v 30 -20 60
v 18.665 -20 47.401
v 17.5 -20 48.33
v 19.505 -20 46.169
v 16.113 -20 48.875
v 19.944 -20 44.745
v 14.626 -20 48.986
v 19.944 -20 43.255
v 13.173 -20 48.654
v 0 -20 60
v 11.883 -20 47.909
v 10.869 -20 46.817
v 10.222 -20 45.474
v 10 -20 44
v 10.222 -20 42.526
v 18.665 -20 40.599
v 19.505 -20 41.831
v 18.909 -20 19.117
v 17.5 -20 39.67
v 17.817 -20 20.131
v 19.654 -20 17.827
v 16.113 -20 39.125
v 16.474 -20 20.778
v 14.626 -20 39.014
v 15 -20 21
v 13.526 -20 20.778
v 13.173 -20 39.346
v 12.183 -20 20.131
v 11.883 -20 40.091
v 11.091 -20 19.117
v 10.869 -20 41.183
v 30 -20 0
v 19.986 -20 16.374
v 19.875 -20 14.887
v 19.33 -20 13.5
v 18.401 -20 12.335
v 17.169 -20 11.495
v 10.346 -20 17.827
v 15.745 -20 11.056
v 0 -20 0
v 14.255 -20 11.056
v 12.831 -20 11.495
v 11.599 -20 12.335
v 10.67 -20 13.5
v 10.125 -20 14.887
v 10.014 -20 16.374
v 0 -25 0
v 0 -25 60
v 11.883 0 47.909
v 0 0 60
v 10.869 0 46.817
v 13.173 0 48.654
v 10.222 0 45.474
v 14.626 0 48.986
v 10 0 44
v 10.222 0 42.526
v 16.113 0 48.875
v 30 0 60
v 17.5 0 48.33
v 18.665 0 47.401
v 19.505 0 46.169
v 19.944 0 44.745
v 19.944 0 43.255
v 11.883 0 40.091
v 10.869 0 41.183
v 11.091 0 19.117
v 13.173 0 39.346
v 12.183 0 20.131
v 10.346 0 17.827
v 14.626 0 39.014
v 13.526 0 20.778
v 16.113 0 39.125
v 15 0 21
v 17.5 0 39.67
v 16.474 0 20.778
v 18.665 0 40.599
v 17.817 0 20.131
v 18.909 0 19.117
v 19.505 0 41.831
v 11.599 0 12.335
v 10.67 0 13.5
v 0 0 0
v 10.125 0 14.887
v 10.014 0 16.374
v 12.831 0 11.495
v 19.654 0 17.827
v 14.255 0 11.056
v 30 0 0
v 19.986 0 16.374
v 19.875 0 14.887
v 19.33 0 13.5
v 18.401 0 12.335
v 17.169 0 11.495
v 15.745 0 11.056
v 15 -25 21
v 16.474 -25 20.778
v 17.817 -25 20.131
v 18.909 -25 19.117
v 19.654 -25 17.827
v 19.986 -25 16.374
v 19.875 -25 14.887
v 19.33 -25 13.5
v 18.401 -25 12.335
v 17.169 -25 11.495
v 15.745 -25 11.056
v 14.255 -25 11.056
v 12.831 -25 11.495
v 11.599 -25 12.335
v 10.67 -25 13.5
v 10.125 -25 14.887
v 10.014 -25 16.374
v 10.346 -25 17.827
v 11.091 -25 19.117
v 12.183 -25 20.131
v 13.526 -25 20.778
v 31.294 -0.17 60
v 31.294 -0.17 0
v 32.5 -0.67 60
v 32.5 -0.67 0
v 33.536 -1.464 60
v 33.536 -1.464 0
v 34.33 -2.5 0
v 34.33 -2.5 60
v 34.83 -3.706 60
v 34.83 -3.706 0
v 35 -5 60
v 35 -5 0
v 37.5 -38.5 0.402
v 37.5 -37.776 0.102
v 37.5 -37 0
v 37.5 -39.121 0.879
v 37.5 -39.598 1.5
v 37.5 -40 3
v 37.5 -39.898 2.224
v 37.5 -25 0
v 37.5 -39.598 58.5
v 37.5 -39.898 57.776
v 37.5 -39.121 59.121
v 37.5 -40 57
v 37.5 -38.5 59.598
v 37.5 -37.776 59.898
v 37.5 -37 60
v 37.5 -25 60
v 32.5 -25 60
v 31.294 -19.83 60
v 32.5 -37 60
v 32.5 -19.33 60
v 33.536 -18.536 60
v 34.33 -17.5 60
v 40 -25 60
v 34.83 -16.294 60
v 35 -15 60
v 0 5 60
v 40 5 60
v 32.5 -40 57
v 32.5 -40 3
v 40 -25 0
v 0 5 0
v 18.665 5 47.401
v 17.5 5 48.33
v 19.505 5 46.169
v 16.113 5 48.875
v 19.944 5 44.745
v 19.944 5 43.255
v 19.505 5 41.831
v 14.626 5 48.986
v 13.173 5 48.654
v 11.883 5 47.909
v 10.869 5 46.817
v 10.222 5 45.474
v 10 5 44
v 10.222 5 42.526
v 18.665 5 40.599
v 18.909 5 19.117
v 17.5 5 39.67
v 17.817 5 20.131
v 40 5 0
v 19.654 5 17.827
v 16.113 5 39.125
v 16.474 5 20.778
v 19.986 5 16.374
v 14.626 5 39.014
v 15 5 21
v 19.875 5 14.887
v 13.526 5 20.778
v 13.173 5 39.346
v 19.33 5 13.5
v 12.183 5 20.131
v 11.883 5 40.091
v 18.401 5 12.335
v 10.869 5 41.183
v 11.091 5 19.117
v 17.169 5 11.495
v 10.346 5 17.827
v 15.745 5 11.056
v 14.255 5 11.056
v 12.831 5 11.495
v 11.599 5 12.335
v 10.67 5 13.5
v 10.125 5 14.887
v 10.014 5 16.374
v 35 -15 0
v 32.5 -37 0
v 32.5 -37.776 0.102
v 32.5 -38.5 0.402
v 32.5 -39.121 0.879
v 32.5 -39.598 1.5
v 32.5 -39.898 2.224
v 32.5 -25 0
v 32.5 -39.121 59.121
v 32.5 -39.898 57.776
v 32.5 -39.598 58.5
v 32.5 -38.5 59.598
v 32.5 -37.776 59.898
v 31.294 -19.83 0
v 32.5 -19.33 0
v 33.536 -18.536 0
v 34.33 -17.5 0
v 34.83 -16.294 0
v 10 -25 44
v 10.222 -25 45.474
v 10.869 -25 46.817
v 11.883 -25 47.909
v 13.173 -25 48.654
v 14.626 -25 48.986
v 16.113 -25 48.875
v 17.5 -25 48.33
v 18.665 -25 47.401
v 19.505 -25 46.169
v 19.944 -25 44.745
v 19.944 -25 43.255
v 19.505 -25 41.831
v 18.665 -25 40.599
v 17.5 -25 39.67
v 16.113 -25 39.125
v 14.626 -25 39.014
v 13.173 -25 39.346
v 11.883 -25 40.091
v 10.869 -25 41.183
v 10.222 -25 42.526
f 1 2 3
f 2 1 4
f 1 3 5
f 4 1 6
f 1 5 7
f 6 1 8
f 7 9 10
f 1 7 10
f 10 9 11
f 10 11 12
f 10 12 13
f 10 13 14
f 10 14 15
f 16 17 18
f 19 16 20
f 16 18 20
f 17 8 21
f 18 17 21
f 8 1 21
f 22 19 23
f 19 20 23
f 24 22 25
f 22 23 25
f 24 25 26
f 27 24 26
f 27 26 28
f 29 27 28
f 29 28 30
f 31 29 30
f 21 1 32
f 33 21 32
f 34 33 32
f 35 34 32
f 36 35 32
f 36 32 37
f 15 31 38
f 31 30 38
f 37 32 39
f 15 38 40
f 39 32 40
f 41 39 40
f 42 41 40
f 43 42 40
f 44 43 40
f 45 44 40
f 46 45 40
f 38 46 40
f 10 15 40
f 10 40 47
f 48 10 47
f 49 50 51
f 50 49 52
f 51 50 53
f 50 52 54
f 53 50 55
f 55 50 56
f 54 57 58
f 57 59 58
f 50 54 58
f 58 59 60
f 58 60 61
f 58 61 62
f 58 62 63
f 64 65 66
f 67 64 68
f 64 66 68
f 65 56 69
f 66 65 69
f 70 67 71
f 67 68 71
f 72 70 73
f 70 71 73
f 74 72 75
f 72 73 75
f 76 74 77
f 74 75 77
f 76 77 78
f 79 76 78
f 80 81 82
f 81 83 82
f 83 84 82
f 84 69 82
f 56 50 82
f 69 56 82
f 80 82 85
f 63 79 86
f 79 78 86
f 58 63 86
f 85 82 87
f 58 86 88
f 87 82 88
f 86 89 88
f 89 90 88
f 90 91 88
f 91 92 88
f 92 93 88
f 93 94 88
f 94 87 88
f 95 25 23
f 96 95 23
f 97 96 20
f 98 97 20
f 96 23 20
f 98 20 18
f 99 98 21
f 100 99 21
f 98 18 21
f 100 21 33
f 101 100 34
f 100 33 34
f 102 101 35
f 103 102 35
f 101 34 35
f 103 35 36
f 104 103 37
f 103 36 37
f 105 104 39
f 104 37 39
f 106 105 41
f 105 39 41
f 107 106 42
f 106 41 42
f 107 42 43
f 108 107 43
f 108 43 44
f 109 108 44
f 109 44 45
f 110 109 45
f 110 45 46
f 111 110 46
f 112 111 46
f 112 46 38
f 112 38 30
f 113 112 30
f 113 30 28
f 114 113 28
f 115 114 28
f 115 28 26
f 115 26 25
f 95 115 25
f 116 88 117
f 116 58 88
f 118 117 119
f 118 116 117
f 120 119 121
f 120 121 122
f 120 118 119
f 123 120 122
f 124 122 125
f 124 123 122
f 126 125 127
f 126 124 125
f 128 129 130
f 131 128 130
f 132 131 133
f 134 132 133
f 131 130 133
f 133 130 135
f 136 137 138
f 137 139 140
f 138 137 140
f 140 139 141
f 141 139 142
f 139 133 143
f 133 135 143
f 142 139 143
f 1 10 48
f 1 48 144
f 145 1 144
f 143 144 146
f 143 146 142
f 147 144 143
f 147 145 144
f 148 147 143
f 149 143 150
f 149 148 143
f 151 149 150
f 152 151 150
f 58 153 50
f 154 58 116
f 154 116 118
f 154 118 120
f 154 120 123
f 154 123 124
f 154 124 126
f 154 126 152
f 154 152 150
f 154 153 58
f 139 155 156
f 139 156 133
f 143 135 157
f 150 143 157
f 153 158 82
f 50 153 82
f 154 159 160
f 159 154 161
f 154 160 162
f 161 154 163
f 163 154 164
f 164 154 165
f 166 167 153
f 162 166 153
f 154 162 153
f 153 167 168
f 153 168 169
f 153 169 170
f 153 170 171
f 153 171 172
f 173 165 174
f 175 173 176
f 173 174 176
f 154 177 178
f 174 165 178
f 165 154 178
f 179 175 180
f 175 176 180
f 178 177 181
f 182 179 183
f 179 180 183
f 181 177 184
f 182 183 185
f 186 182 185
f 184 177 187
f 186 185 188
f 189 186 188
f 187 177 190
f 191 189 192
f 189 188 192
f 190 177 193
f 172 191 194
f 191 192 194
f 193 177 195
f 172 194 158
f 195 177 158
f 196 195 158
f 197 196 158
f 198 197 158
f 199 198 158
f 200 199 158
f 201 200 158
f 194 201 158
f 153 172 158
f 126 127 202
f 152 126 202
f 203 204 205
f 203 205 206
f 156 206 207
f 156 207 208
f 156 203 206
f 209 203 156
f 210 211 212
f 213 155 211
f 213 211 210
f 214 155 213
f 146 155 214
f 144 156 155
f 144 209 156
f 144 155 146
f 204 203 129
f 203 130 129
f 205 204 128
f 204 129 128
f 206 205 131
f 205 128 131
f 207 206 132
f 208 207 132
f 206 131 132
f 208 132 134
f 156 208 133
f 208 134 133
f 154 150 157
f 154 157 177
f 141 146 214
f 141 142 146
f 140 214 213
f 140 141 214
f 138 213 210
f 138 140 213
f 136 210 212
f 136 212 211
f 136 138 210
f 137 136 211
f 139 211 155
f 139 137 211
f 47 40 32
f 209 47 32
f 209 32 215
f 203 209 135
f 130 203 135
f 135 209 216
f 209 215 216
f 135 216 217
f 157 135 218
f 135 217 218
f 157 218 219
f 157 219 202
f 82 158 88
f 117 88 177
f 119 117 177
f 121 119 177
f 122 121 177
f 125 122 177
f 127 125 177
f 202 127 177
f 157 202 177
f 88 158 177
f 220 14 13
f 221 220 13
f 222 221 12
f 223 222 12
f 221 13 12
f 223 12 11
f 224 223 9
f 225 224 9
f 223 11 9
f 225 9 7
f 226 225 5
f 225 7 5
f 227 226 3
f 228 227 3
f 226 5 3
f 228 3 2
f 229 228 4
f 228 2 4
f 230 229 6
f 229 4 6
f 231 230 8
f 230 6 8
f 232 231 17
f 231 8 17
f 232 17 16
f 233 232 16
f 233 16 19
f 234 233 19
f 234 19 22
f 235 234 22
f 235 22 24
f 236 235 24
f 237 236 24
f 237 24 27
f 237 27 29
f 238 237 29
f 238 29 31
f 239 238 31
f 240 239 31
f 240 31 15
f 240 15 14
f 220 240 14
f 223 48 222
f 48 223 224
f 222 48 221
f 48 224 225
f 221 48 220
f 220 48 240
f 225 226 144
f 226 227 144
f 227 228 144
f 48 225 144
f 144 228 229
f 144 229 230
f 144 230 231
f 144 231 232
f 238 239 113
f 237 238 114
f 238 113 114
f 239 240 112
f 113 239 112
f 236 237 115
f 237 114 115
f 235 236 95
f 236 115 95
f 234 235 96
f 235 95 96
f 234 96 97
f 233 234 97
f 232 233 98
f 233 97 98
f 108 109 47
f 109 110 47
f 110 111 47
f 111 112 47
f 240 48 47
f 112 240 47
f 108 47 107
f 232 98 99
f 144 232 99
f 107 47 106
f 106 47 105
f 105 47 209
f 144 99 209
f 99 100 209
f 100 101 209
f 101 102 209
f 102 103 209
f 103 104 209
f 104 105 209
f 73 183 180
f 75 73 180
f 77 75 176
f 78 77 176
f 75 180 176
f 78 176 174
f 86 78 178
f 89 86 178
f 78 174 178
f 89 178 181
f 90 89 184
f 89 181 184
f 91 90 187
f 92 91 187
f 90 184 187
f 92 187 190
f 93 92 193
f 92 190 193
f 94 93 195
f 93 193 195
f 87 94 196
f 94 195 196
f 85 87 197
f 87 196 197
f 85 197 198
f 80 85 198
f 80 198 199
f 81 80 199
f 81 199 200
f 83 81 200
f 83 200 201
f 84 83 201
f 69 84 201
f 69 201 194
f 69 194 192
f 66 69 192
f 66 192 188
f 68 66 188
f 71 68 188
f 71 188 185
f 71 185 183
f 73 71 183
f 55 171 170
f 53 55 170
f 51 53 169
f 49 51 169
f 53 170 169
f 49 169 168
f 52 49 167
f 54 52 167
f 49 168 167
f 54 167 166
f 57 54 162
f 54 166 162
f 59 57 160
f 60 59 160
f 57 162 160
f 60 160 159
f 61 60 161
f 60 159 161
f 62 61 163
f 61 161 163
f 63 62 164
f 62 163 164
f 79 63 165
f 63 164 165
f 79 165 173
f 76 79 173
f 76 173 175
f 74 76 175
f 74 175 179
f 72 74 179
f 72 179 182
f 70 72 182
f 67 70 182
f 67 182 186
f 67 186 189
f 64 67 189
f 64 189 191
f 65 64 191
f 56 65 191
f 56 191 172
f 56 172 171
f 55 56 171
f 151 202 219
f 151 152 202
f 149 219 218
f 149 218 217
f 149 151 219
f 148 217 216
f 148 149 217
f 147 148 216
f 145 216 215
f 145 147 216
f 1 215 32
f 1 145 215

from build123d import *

# Parameters (mm, degrees)
BOSS_EXTRUDE1_DEPTH = 60
FILLET1_R           = 5
SKETCH2_R           = 5
CUT_EXTRUDE1_DEPTH  = 75
SKETCH3_W           = 5
SKETCH3_H           = 60
BOSS_EXTRUDE2_DEPTH = 15
FILLET3_R           = 3


with BuildPart() as part:
    # Sketch1 → Boss-Extrude1 (new body)
    with BuildSketch(Plane.XY):
        Polygon((0, 0), (35, 0), (35, -20), (0, -20), (0, -25), (40, -25), (40, 5), (0, 5), align=None)
    extrude(amount=BOSS_EXTRUDE1_DEPTH)

    # Fillet1
    fillet1_edges = [part.edges().sort_by_distance(p)[0] for p in [
        (35, -20, 30),
        (35, 0, 30),
    ]]
    fillet(fillet1_edges, radius=FILLET1_R)

    # Sketch2 → Cut-Extrude1 (cut)
    with BuildSketch(Plane(origin=(0, 5, 0), x_dir=(1, 0, 0), z_dir=(0, 1, 0))):
        with Locations(Location((15, -44, 0), (0, 0, 180))):
            Circle(SKETCH2_R)
        with Locations(Location((15, -16, 0), (0, 0, 270))):
            Circle(SKETCH2_R)
    extrude(amount=-CUT_EXTRUDE1_DEPTH, mode=Mode.SUBTRACT)

    # Sketch3 → Boss-Extrude2 (add)
    with BuildSketch(Plane.XZ.offset(25)):
        with Locations((35, 30)):
            Rectangle(SKETCH3_W, SKETCH3_H)
    extrude(amount=BOSS_EXTRUDE2_DEPTH)

    # Fillet3
    fillet3_edges = [part.edges().sort_by_distance(p)[0] for p in [
        (35, -40, 0),
        (35, -40, 60),
    ]]
    fillet(fillet3_edges, radius=FILLET3_R)


solid = part.part
